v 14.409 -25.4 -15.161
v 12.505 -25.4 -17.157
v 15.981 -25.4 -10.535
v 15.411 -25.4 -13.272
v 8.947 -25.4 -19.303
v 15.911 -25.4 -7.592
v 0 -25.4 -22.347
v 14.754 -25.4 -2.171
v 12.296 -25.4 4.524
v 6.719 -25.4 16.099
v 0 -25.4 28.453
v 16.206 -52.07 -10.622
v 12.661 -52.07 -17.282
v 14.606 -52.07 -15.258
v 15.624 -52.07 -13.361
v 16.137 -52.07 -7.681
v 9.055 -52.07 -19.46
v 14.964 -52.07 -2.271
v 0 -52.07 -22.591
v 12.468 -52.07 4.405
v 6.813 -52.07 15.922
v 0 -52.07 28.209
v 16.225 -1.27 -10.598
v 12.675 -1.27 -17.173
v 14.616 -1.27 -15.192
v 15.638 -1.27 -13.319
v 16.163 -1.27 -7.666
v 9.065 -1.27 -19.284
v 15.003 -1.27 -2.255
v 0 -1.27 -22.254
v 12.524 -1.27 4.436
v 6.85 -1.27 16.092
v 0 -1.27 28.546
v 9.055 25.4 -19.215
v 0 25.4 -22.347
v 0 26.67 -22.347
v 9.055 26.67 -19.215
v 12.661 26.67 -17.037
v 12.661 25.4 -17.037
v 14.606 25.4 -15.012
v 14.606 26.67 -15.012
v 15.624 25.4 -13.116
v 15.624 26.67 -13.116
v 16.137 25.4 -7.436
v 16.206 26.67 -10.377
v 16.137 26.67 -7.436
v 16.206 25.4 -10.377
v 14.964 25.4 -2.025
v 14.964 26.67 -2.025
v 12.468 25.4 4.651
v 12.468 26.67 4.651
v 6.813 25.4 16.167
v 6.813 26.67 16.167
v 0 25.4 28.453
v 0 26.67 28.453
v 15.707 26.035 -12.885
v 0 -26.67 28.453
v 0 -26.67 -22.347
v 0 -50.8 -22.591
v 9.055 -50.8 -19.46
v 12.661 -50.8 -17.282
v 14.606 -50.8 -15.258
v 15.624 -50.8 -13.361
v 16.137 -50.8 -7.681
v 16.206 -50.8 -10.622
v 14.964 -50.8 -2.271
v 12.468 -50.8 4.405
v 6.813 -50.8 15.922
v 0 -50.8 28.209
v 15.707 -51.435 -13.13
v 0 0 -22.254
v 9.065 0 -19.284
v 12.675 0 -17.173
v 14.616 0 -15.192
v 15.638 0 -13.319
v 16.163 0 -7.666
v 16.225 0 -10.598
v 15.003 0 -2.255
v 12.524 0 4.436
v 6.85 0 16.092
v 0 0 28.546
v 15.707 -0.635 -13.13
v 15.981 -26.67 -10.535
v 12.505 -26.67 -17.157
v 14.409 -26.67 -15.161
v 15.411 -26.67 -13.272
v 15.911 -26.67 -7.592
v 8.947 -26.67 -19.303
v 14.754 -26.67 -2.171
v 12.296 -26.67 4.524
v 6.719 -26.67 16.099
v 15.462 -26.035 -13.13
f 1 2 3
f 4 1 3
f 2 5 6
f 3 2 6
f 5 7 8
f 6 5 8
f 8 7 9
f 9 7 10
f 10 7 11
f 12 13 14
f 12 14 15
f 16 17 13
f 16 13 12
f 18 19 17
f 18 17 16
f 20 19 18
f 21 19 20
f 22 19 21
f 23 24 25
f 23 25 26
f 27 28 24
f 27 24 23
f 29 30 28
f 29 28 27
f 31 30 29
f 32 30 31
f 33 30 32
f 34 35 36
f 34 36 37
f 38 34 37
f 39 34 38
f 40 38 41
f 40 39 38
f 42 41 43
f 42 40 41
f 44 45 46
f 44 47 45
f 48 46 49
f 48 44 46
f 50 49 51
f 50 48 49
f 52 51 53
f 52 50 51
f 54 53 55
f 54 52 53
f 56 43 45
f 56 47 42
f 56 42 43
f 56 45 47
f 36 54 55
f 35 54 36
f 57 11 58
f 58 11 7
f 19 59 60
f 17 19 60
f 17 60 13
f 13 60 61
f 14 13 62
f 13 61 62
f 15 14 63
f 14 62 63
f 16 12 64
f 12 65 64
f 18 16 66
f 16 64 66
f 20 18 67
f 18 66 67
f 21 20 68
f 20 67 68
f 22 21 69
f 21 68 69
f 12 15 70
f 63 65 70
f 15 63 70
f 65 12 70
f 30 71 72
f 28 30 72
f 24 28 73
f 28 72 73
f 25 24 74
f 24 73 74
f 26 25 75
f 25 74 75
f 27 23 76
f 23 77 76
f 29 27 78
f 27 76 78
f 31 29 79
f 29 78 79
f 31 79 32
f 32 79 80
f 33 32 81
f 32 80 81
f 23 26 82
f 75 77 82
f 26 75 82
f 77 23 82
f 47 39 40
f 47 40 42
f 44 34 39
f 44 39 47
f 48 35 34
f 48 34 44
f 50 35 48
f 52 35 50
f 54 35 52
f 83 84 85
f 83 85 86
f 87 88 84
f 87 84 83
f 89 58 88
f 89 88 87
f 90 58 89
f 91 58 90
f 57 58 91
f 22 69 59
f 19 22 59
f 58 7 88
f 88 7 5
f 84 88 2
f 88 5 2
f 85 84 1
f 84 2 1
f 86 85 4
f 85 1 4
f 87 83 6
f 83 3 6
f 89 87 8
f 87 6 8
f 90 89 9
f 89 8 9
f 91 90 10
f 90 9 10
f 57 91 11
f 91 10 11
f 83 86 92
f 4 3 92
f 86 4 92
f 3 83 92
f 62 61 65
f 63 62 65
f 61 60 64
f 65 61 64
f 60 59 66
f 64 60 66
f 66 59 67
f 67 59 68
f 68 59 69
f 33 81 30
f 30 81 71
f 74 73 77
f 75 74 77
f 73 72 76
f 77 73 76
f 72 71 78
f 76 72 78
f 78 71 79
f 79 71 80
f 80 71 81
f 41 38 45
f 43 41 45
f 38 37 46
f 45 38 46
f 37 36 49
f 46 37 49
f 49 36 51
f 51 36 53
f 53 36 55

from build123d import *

# Parameters (mm, degrees)
F7_DEPTH  = 1.27
F8_DEPTH  = 1.27
F9_DEPTH  = 1.27
F10_DEPTH = 1.27


with BuildPart() as f7:
    # F6 (on offset) → F7 (new body)
    with BuildSketch(Plane.XZ.offset(50.8)):
        with BuildLine():
            Line((0, 28.2086534786), (0, -22.5913465214))
            add(Edge.make_bspline(
                [(0, -22.5913465214), (6.9215770732, -20.5578935876), (24.592143562, -15.3665528153), (9.301365994, 11.7274166566), (0, 28.2086534786)],
                knots=[0, 0, 0, 0, 0.3917009156, 1, 1, 1, 1], degree=3))
        make_face()
    extrude(amount=F7_DEPTH)


with BuildPart() as f8:
    # F4 (on offset) → F8 (new body)
    with BuildSketch(Plane.XZ.offset(-25.4)):
        with BuildLine():
            Line((0, 28.4528839136), (0, -22.3471160864))
            add(Edge.make_bspline(
                [(0, -22.3471160864), (6.9216263577, -20.3132058989), (24.5920011472, -15.1207910756), (9.3012452111, 11.9723448393), (0, 28.4528839136)],
                knots=[0, 0, 0, 0, 0.3917079541, 1, 1, 1, 1], degree=3))
        make_face()
    extrude(amount=-F8_DEPTH)


with BuildPart() as f9:
    # F0 (on Front) → F9 (new body)
    with BuildSketch(Plane.XZ):
        with BuildLine():
            Line((0, 28.5458717371), (0, -22.2541282629))
            add(Edge.make_bspline(
                [(0, -22.2541282629), (6.9077151611, -20.3491349985), (24.6318359356, -15.4612191093), (9.3350740929, 11.8678841629), (0, 28.5458717371)],
                knots=[0, 0, 0, 0, 0.3897352793, 1, 1, 1, 1], degree=3))
        make_face()
    extrude(amount=F9_DEPTH)


with BuildPart() as f10:
    # F2 (on offset) → F10 (new body)
    with BuildSketch(Plane.XZ.offset(25.4)):
        with BuildLine():
            Line((0, 28.4528839136), (0, -22.3471160864))
            add(Edge.make_bspline(
                [(0, -22.3471160864), (6.7955129572, -20.3949767035), (24.2594154309, -15.3781410338), (9.199708767, 11.8311864277), (0, 28.4528839136)],
                knots=[0, 0, 0, 0, 0.3891176653, 1, 1, 1, 1], degree=3))
        make_face()
    extrude(amount=F10_DEPTH)


solid = Compound([f7.part, f8.part, f9.part, f10.part])
